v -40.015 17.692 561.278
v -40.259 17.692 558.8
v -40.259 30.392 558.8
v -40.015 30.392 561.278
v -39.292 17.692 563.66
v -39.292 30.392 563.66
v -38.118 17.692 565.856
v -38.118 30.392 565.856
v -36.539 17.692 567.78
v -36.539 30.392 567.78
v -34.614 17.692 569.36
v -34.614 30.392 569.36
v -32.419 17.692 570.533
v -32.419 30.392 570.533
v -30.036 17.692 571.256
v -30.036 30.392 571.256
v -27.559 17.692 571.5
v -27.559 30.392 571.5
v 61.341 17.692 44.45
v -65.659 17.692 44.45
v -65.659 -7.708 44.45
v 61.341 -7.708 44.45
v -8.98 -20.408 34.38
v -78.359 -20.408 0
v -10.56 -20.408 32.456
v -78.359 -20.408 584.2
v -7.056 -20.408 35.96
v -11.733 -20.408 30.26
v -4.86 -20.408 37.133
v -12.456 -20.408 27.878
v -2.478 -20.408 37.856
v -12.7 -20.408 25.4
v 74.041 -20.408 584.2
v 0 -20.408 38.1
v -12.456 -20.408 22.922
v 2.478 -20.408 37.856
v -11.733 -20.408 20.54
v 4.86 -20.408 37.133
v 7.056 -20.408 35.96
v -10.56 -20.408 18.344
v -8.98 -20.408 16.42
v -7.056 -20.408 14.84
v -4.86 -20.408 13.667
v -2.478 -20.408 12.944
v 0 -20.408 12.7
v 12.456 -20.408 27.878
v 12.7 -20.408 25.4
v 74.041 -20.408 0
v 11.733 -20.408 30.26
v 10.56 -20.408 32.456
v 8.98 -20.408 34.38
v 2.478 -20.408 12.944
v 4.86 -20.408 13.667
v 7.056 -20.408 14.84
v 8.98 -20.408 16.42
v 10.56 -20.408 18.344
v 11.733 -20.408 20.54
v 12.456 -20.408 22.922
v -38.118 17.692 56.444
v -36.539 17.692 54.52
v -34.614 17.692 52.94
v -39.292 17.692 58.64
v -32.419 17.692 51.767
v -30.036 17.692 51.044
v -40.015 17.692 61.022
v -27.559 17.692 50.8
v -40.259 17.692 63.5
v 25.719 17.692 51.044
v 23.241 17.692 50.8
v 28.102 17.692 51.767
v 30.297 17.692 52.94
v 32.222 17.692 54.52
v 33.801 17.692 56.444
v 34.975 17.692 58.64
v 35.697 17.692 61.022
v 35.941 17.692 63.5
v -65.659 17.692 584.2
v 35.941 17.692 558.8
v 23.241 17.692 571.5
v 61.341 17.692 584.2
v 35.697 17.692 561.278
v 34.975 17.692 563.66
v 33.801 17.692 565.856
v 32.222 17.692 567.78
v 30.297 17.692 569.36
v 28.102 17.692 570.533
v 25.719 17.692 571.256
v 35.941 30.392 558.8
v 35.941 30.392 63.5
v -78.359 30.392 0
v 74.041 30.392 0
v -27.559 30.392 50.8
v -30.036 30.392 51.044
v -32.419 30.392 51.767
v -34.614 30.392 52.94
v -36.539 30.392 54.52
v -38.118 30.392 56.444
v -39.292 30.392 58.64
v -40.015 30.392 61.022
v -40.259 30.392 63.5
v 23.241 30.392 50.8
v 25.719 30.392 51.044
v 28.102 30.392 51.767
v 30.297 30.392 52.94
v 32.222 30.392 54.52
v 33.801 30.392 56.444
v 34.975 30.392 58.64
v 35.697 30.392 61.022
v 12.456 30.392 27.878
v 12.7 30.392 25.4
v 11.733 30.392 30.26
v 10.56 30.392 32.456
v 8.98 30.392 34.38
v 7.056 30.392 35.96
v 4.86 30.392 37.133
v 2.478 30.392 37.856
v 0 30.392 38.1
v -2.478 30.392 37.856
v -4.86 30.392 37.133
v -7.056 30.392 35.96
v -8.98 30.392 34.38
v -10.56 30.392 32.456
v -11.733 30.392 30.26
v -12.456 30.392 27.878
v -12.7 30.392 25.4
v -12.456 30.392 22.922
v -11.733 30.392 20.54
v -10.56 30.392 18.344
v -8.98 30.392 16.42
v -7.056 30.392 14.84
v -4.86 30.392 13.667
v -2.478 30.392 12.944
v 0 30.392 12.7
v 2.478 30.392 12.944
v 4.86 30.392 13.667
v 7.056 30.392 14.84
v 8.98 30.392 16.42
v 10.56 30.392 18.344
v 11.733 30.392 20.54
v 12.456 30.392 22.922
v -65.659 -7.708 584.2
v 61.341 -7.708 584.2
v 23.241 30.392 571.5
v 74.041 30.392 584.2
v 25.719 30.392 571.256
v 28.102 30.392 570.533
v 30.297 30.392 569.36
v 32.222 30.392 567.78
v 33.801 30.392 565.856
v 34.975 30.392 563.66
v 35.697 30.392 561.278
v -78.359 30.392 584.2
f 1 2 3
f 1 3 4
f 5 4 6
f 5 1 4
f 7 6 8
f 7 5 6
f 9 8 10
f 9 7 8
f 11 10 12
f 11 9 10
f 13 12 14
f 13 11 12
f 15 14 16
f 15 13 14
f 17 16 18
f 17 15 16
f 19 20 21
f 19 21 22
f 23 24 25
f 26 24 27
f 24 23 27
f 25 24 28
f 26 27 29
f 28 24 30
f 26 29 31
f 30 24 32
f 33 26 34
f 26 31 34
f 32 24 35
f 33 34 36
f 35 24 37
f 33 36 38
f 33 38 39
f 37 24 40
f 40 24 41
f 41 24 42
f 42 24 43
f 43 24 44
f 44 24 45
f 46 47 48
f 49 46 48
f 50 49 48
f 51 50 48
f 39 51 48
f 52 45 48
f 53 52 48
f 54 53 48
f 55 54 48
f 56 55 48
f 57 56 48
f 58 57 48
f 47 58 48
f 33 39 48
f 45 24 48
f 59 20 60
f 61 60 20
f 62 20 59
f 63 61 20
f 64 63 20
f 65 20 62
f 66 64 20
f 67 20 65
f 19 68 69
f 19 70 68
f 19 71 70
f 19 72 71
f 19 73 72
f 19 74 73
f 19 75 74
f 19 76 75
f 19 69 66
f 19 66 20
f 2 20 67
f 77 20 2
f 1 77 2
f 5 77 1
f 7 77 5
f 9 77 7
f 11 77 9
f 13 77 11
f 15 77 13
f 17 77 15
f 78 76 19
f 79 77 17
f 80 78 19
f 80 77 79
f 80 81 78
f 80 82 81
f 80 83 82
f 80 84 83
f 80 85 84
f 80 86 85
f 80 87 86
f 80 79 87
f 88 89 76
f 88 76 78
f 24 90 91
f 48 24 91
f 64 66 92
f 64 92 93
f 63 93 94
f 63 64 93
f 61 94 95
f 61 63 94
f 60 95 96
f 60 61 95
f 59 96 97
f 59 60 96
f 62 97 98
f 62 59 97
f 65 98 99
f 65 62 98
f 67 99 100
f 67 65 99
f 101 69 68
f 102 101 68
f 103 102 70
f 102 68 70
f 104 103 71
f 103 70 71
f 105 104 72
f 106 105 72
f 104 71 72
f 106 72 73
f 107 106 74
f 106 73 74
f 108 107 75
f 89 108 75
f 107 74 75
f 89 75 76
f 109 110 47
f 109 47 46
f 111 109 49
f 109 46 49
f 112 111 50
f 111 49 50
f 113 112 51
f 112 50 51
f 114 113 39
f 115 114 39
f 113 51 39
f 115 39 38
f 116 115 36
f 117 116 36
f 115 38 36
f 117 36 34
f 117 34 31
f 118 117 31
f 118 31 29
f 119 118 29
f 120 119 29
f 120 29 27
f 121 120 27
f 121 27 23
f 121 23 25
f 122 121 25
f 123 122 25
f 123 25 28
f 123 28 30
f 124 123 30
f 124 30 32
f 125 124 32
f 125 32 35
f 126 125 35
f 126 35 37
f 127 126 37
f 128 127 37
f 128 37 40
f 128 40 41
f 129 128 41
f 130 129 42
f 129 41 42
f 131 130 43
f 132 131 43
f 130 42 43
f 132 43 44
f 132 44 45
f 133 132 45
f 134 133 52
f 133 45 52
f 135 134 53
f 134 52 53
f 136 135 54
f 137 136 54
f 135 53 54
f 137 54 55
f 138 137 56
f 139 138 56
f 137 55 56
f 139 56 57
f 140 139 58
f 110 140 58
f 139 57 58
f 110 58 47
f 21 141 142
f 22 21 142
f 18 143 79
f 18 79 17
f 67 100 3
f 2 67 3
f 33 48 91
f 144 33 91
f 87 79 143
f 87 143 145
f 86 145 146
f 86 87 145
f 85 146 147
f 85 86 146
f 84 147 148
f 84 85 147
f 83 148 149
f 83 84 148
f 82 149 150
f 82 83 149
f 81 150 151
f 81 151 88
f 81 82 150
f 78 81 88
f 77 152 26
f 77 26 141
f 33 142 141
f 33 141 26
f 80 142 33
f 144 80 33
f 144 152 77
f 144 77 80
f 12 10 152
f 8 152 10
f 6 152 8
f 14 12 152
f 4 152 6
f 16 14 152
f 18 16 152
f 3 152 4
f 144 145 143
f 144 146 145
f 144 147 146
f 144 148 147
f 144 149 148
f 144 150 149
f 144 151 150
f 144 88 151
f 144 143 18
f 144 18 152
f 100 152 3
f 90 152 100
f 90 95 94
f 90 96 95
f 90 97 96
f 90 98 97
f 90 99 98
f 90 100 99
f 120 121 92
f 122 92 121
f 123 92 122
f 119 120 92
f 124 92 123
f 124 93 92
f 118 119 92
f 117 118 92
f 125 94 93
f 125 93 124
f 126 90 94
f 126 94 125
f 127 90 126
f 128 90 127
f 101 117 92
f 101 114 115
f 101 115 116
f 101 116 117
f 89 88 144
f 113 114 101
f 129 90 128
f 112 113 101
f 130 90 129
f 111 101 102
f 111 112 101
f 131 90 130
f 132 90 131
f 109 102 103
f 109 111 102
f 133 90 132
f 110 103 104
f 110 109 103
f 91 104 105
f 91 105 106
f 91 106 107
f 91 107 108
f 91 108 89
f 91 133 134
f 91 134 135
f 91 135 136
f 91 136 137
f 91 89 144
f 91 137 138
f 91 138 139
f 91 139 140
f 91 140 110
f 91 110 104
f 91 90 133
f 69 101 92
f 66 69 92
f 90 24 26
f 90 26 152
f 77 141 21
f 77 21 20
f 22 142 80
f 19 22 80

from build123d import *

# Parameters (mm, degrees)
F0_W     = 152.4
F0_H     = 50.8
F1_DEPTH = 584.2
F2_R     = 12.7
F3_DEPTH = 50.801
F4_W     = 76.2
F4_H     = 520.7
F5_DEPTH = 25.4
F6_R     = 12.7
F7_W     = 127
F7_H     = 25.4
F8_DEPTH = 539.75


with BuildPart() as f1:
    # F0 (on Top) → F1 (new body)
    with BuildSketch(Plane.XY):
        with Locations((-2.158545, 4.991524)):
            Rectangle(F0_W, F0_H)
    extrude(amount=F1_DEPTH)

    # F2 (on face) → F3 (cut, through all)
    with BuildSketch(Plane.XZ.offset(20.408476)):
        with Locations((0, 25.4)):
            Circle(F2_R)
    extrude(amount=-F3_DEPTH, mode=Mode.SUBTRACT)

    # F4 (on face) → F5 (cut)
    with BuildSketch(Plane(origin=(0, 30.391524, 0), x_dir=(-1, 0, 0), z_dir=(0, 1, 0))):
        with Locations((2.158545, 311.15)):
            Rectangle(F4_W, F4_H)
    extrude(amount=-F5_DEPTH, mode=Mode.SUBTRACT)

    # F6
    f6_edges = [f1.edges().sort_by_distance(p)[0] for p in [
        (35.941455, 17.691524, 50.8),
        (-40.258545, 17.691524, 50.8),
        (-40.258545, 17.691524, 571.5),
        (35.941455, 17.691524, 571.5),
    ]]
    fillet(f6_edges, radius=F6_R)

    # F7 (on face) → F8 (cut)
    with BuildSketch(Plane.XY.offset(584.2)):
        with Locations((-2.158545, 4.991524)):
            Rectangle(F7_W, F7_H)
    extrude(amount=-F8_DEPTH, mode=Mode.SUBTRACT)


solid = f1.part
